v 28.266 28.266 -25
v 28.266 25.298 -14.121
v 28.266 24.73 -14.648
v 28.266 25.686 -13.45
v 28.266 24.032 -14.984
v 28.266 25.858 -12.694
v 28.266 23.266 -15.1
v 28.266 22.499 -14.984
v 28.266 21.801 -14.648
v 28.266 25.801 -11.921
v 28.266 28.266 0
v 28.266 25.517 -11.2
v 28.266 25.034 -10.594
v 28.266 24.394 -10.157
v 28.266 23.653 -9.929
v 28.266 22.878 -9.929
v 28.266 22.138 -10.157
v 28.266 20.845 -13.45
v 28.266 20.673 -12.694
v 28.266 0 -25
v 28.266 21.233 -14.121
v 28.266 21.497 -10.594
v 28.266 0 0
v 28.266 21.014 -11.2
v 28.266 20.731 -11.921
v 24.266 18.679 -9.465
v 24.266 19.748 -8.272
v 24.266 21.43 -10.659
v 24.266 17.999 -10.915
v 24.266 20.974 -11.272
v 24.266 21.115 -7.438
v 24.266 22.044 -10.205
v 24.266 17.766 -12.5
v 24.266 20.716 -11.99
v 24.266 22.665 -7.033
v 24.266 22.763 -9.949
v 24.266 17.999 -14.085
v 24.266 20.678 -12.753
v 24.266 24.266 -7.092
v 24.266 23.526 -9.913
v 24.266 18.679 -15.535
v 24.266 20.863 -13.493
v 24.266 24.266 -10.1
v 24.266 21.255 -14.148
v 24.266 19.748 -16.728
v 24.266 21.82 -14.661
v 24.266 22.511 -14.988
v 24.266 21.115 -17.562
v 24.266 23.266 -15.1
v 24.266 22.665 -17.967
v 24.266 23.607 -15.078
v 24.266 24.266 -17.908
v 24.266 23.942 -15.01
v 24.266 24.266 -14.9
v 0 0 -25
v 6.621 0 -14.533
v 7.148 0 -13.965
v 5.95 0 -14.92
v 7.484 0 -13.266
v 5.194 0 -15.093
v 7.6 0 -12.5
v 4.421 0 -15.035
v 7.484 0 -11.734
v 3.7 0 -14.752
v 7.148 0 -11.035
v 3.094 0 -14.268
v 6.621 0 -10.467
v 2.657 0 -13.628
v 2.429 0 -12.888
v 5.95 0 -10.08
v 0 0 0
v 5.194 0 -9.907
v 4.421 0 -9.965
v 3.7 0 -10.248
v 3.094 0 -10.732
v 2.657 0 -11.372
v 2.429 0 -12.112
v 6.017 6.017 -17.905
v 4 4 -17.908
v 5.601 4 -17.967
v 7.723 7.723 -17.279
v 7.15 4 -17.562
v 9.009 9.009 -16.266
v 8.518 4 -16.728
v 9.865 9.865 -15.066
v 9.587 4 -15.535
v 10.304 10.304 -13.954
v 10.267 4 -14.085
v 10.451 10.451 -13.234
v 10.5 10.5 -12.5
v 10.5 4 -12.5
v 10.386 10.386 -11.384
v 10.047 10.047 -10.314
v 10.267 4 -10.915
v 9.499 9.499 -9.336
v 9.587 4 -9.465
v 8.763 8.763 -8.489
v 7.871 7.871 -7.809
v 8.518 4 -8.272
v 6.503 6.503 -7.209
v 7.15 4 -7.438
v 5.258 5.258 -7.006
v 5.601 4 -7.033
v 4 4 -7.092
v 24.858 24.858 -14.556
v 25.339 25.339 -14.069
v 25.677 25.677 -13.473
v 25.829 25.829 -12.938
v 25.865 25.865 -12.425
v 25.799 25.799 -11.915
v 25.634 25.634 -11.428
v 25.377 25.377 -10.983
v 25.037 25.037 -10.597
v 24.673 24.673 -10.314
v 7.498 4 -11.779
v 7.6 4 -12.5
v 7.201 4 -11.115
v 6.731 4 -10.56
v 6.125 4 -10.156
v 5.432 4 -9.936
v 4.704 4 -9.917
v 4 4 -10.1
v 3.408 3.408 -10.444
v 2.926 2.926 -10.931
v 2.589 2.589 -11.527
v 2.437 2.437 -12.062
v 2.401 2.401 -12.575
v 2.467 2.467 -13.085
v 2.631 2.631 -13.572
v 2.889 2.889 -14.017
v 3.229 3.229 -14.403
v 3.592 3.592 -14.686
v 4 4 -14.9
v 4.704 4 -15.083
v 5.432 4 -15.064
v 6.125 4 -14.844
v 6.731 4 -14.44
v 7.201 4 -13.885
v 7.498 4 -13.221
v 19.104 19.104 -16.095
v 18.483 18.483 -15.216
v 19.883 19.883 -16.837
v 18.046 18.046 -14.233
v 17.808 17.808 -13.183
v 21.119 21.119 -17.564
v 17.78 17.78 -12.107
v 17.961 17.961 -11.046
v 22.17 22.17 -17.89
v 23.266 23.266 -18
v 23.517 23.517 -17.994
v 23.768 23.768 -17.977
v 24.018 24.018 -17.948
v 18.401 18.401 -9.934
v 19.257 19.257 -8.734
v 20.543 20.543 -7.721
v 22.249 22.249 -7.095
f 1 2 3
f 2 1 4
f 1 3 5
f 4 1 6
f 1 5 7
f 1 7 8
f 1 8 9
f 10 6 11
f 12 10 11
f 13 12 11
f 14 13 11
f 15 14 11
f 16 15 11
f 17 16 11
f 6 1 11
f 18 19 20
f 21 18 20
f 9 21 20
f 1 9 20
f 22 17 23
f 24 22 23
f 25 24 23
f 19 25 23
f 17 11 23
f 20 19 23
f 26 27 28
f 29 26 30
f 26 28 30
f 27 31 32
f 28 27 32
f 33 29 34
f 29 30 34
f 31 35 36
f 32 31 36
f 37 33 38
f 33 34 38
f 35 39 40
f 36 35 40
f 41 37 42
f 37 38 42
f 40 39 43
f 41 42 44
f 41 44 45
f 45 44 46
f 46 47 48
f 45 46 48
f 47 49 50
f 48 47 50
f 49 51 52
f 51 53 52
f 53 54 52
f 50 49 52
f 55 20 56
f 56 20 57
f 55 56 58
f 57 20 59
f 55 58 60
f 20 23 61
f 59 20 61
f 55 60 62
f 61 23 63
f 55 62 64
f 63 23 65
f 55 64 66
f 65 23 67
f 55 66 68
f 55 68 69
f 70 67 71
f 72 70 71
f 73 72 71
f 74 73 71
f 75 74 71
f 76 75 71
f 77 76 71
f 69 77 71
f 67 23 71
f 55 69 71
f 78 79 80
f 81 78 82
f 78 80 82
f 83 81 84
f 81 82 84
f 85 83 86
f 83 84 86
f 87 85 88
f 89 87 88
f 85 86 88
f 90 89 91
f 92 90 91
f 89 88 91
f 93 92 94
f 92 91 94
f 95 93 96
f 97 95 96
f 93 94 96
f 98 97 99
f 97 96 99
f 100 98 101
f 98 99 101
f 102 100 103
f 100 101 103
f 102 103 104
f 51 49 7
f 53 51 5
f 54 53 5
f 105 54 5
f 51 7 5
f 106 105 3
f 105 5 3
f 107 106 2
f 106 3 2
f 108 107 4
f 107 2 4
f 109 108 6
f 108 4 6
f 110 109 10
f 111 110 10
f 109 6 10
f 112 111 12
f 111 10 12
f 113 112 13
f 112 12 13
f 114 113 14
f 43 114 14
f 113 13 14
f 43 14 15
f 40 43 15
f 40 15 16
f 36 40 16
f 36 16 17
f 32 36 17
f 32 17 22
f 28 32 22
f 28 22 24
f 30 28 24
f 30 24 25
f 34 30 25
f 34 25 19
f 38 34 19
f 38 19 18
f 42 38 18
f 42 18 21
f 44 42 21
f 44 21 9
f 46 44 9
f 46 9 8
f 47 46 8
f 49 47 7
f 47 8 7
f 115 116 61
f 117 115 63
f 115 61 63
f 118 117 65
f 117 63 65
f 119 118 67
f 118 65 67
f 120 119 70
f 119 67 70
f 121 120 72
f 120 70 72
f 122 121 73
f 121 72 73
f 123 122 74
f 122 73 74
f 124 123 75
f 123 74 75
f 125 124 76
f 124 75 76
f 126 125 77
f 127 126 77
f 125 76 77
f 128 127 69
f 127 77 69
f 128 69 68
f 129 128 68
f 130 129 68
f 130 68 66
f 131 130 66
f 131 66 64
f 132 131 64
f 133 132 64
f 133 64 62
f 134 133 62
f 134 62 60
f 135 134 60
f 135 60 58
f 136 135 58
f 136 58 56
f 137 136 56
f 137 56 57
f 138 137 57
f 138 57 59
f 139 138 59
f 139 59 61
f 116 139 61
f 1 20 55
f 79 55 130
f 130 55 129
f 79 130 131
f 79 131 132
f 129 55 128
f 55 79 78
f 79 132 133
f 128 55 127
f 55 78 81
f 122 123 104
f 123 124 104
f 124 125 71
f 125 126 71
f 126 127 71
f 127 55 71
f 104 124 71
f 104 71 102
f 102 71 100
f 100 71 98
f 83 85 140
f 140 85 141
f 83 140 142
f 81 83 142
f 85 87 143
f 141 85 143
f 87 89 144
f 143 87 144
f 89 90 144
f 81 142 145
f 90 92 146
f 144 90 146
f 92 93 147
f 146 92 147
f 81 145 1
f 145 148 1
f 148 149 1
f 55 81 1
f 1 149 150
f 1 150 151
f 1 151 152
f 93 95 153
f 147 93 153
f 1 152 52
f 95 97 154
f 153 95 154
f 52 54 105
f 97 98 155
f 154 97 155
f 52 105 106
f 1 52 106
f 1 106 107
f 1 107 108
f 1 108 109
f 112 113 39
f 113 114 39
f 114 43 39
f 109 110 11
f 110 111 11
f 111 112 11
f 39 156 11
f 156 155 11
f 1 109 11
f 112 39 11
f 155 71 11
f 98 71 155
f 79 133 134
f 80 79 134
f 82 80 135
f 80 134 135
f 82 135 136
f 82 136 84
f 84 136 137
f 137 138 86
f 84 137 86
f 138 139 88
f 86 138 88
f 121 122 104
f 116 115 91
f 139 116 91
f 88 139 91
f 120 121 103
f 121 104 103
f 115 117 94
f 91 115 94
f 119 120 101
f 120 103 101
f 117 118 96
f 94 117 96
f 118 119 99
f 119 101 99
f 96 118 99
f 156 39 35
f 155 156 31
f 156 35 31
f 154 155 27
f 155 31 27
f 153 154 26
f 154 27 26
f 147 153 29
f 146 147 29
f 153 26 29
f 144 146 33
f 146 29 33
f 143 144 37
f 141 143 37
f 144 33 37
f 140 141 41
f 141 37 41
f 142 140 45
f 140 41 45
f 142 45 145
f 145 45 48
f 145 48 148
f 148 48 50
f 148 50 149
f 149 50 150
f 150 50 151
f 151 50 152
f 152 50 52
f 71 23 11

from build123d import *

# Parameters (mm, degrees)
BOSS_EXTRUDE1_DEPTH            = 25
SKETCH2_R                      = 2.6
CUT_EXTRUDE1_DEPTH             = 29.265728709
CUT_EXTRUDE2_REACH             = 30.266
SKETCH3_R                      = 2.6
CUT_EXTRUDE2_DIRECTION_2_DEPTH = 1
CUT_EXTRUDE3_START             = -4
SKETCH5_R                      = 5.5
CUT_EXTRUDE3_DEPTH             = 25.265728709
CUT_EXTRUDE4_START             = -4
SKETCH7_R                      = 5.5
CUT_EXTRUDE4_DEPTH             = 25.265728709


with BuildPart() as part:
    # Sketch1 → Boss-Extrude1 (new body)
    with BuildSketch(Plane.XY):
        Polygon((0, 0), (28.265728709, 28.265728709), (28.265728709, 0), align=None)
    extrude(amount=-BOSS_EXTRUDE1_DEPTH)

    # Sketch2 → Cut-Extrude1 (cut, through all)
    with BuildSketch(Plane.XZ):
        with Locations((5, -12.5)):
            Circle(SKETCH2_R)
    extrude(amount=-CUT_EXTRUDE1_DEPTH, mode=Mode.SUBTRACT)

    # Sketch3 → Cut-Extrude2 (cut, up to next)
    with BuildSketch(Plane(origin=(28.265728709, 0, 0), x_dir=(0, 0, -1), z_dir=(1, 0, 0)), mode=Mode.PRIVATE) as cut_extrude2_sk1:
        with Locations((12.5, 23.265728709)):
            Circle(SKETCH3_R)
    cut_extrude2_tool1 = extrude(cut_extrude2_sk1.sketch, amount=-CUT_EXTRUDE2_REACH, mode=Mode.PRIVATE) & part.part
    add(cut_extrude2_tool1.solids().sort_by_distance((28.265729, 23.265729, -12.5))[0], mode=Mode.SUBTRACT)

    # Sketch3 → Cut-Extrude2 direction 2 (cut)
    with BuildSketch(Plane(origin=(28.265728709, 0, 0), x_dir=(0, 0, -1), z_dir=(1, 0, 0))):
        with Locations((12.5, 23.265728709)):
            Circle(SKETCH3_R)
    extrude(amount=CUT_EXTRUDE2_DIRECTION_2_DEPTH, mode=Mode.SUBTRACT)

    # Sketch5 → Cut-Extrude3 (cut, through all)
    with BuildSketch(Plane(origin=(28.265728709, 0, 0), x_dir=(0, 0, -1), z_dir=(1, 0, 0)).offset(CUT_EXTRUDE3_START)):
        with Locations((12.5, 23.265728709)):
            Circle(SKETCH5_R)
    extrude(amount=-CUT_EXTRUDE3_DEPTH, mode=Mode.SUBTRACT)

    # Sketch7 → Cut-Extrude4 (cut, through all)
    with BuildSketch(Plane.XZ.offset(CUT_EXTRUDE4_START)):
        with Locations((5, -12.5)):
            Circle(SKETCH7_R)
    extrude(amount=-CUT_EXTRUDE4_DEPTH, mode=Mode.SUBTRACT)


solid = part.part
